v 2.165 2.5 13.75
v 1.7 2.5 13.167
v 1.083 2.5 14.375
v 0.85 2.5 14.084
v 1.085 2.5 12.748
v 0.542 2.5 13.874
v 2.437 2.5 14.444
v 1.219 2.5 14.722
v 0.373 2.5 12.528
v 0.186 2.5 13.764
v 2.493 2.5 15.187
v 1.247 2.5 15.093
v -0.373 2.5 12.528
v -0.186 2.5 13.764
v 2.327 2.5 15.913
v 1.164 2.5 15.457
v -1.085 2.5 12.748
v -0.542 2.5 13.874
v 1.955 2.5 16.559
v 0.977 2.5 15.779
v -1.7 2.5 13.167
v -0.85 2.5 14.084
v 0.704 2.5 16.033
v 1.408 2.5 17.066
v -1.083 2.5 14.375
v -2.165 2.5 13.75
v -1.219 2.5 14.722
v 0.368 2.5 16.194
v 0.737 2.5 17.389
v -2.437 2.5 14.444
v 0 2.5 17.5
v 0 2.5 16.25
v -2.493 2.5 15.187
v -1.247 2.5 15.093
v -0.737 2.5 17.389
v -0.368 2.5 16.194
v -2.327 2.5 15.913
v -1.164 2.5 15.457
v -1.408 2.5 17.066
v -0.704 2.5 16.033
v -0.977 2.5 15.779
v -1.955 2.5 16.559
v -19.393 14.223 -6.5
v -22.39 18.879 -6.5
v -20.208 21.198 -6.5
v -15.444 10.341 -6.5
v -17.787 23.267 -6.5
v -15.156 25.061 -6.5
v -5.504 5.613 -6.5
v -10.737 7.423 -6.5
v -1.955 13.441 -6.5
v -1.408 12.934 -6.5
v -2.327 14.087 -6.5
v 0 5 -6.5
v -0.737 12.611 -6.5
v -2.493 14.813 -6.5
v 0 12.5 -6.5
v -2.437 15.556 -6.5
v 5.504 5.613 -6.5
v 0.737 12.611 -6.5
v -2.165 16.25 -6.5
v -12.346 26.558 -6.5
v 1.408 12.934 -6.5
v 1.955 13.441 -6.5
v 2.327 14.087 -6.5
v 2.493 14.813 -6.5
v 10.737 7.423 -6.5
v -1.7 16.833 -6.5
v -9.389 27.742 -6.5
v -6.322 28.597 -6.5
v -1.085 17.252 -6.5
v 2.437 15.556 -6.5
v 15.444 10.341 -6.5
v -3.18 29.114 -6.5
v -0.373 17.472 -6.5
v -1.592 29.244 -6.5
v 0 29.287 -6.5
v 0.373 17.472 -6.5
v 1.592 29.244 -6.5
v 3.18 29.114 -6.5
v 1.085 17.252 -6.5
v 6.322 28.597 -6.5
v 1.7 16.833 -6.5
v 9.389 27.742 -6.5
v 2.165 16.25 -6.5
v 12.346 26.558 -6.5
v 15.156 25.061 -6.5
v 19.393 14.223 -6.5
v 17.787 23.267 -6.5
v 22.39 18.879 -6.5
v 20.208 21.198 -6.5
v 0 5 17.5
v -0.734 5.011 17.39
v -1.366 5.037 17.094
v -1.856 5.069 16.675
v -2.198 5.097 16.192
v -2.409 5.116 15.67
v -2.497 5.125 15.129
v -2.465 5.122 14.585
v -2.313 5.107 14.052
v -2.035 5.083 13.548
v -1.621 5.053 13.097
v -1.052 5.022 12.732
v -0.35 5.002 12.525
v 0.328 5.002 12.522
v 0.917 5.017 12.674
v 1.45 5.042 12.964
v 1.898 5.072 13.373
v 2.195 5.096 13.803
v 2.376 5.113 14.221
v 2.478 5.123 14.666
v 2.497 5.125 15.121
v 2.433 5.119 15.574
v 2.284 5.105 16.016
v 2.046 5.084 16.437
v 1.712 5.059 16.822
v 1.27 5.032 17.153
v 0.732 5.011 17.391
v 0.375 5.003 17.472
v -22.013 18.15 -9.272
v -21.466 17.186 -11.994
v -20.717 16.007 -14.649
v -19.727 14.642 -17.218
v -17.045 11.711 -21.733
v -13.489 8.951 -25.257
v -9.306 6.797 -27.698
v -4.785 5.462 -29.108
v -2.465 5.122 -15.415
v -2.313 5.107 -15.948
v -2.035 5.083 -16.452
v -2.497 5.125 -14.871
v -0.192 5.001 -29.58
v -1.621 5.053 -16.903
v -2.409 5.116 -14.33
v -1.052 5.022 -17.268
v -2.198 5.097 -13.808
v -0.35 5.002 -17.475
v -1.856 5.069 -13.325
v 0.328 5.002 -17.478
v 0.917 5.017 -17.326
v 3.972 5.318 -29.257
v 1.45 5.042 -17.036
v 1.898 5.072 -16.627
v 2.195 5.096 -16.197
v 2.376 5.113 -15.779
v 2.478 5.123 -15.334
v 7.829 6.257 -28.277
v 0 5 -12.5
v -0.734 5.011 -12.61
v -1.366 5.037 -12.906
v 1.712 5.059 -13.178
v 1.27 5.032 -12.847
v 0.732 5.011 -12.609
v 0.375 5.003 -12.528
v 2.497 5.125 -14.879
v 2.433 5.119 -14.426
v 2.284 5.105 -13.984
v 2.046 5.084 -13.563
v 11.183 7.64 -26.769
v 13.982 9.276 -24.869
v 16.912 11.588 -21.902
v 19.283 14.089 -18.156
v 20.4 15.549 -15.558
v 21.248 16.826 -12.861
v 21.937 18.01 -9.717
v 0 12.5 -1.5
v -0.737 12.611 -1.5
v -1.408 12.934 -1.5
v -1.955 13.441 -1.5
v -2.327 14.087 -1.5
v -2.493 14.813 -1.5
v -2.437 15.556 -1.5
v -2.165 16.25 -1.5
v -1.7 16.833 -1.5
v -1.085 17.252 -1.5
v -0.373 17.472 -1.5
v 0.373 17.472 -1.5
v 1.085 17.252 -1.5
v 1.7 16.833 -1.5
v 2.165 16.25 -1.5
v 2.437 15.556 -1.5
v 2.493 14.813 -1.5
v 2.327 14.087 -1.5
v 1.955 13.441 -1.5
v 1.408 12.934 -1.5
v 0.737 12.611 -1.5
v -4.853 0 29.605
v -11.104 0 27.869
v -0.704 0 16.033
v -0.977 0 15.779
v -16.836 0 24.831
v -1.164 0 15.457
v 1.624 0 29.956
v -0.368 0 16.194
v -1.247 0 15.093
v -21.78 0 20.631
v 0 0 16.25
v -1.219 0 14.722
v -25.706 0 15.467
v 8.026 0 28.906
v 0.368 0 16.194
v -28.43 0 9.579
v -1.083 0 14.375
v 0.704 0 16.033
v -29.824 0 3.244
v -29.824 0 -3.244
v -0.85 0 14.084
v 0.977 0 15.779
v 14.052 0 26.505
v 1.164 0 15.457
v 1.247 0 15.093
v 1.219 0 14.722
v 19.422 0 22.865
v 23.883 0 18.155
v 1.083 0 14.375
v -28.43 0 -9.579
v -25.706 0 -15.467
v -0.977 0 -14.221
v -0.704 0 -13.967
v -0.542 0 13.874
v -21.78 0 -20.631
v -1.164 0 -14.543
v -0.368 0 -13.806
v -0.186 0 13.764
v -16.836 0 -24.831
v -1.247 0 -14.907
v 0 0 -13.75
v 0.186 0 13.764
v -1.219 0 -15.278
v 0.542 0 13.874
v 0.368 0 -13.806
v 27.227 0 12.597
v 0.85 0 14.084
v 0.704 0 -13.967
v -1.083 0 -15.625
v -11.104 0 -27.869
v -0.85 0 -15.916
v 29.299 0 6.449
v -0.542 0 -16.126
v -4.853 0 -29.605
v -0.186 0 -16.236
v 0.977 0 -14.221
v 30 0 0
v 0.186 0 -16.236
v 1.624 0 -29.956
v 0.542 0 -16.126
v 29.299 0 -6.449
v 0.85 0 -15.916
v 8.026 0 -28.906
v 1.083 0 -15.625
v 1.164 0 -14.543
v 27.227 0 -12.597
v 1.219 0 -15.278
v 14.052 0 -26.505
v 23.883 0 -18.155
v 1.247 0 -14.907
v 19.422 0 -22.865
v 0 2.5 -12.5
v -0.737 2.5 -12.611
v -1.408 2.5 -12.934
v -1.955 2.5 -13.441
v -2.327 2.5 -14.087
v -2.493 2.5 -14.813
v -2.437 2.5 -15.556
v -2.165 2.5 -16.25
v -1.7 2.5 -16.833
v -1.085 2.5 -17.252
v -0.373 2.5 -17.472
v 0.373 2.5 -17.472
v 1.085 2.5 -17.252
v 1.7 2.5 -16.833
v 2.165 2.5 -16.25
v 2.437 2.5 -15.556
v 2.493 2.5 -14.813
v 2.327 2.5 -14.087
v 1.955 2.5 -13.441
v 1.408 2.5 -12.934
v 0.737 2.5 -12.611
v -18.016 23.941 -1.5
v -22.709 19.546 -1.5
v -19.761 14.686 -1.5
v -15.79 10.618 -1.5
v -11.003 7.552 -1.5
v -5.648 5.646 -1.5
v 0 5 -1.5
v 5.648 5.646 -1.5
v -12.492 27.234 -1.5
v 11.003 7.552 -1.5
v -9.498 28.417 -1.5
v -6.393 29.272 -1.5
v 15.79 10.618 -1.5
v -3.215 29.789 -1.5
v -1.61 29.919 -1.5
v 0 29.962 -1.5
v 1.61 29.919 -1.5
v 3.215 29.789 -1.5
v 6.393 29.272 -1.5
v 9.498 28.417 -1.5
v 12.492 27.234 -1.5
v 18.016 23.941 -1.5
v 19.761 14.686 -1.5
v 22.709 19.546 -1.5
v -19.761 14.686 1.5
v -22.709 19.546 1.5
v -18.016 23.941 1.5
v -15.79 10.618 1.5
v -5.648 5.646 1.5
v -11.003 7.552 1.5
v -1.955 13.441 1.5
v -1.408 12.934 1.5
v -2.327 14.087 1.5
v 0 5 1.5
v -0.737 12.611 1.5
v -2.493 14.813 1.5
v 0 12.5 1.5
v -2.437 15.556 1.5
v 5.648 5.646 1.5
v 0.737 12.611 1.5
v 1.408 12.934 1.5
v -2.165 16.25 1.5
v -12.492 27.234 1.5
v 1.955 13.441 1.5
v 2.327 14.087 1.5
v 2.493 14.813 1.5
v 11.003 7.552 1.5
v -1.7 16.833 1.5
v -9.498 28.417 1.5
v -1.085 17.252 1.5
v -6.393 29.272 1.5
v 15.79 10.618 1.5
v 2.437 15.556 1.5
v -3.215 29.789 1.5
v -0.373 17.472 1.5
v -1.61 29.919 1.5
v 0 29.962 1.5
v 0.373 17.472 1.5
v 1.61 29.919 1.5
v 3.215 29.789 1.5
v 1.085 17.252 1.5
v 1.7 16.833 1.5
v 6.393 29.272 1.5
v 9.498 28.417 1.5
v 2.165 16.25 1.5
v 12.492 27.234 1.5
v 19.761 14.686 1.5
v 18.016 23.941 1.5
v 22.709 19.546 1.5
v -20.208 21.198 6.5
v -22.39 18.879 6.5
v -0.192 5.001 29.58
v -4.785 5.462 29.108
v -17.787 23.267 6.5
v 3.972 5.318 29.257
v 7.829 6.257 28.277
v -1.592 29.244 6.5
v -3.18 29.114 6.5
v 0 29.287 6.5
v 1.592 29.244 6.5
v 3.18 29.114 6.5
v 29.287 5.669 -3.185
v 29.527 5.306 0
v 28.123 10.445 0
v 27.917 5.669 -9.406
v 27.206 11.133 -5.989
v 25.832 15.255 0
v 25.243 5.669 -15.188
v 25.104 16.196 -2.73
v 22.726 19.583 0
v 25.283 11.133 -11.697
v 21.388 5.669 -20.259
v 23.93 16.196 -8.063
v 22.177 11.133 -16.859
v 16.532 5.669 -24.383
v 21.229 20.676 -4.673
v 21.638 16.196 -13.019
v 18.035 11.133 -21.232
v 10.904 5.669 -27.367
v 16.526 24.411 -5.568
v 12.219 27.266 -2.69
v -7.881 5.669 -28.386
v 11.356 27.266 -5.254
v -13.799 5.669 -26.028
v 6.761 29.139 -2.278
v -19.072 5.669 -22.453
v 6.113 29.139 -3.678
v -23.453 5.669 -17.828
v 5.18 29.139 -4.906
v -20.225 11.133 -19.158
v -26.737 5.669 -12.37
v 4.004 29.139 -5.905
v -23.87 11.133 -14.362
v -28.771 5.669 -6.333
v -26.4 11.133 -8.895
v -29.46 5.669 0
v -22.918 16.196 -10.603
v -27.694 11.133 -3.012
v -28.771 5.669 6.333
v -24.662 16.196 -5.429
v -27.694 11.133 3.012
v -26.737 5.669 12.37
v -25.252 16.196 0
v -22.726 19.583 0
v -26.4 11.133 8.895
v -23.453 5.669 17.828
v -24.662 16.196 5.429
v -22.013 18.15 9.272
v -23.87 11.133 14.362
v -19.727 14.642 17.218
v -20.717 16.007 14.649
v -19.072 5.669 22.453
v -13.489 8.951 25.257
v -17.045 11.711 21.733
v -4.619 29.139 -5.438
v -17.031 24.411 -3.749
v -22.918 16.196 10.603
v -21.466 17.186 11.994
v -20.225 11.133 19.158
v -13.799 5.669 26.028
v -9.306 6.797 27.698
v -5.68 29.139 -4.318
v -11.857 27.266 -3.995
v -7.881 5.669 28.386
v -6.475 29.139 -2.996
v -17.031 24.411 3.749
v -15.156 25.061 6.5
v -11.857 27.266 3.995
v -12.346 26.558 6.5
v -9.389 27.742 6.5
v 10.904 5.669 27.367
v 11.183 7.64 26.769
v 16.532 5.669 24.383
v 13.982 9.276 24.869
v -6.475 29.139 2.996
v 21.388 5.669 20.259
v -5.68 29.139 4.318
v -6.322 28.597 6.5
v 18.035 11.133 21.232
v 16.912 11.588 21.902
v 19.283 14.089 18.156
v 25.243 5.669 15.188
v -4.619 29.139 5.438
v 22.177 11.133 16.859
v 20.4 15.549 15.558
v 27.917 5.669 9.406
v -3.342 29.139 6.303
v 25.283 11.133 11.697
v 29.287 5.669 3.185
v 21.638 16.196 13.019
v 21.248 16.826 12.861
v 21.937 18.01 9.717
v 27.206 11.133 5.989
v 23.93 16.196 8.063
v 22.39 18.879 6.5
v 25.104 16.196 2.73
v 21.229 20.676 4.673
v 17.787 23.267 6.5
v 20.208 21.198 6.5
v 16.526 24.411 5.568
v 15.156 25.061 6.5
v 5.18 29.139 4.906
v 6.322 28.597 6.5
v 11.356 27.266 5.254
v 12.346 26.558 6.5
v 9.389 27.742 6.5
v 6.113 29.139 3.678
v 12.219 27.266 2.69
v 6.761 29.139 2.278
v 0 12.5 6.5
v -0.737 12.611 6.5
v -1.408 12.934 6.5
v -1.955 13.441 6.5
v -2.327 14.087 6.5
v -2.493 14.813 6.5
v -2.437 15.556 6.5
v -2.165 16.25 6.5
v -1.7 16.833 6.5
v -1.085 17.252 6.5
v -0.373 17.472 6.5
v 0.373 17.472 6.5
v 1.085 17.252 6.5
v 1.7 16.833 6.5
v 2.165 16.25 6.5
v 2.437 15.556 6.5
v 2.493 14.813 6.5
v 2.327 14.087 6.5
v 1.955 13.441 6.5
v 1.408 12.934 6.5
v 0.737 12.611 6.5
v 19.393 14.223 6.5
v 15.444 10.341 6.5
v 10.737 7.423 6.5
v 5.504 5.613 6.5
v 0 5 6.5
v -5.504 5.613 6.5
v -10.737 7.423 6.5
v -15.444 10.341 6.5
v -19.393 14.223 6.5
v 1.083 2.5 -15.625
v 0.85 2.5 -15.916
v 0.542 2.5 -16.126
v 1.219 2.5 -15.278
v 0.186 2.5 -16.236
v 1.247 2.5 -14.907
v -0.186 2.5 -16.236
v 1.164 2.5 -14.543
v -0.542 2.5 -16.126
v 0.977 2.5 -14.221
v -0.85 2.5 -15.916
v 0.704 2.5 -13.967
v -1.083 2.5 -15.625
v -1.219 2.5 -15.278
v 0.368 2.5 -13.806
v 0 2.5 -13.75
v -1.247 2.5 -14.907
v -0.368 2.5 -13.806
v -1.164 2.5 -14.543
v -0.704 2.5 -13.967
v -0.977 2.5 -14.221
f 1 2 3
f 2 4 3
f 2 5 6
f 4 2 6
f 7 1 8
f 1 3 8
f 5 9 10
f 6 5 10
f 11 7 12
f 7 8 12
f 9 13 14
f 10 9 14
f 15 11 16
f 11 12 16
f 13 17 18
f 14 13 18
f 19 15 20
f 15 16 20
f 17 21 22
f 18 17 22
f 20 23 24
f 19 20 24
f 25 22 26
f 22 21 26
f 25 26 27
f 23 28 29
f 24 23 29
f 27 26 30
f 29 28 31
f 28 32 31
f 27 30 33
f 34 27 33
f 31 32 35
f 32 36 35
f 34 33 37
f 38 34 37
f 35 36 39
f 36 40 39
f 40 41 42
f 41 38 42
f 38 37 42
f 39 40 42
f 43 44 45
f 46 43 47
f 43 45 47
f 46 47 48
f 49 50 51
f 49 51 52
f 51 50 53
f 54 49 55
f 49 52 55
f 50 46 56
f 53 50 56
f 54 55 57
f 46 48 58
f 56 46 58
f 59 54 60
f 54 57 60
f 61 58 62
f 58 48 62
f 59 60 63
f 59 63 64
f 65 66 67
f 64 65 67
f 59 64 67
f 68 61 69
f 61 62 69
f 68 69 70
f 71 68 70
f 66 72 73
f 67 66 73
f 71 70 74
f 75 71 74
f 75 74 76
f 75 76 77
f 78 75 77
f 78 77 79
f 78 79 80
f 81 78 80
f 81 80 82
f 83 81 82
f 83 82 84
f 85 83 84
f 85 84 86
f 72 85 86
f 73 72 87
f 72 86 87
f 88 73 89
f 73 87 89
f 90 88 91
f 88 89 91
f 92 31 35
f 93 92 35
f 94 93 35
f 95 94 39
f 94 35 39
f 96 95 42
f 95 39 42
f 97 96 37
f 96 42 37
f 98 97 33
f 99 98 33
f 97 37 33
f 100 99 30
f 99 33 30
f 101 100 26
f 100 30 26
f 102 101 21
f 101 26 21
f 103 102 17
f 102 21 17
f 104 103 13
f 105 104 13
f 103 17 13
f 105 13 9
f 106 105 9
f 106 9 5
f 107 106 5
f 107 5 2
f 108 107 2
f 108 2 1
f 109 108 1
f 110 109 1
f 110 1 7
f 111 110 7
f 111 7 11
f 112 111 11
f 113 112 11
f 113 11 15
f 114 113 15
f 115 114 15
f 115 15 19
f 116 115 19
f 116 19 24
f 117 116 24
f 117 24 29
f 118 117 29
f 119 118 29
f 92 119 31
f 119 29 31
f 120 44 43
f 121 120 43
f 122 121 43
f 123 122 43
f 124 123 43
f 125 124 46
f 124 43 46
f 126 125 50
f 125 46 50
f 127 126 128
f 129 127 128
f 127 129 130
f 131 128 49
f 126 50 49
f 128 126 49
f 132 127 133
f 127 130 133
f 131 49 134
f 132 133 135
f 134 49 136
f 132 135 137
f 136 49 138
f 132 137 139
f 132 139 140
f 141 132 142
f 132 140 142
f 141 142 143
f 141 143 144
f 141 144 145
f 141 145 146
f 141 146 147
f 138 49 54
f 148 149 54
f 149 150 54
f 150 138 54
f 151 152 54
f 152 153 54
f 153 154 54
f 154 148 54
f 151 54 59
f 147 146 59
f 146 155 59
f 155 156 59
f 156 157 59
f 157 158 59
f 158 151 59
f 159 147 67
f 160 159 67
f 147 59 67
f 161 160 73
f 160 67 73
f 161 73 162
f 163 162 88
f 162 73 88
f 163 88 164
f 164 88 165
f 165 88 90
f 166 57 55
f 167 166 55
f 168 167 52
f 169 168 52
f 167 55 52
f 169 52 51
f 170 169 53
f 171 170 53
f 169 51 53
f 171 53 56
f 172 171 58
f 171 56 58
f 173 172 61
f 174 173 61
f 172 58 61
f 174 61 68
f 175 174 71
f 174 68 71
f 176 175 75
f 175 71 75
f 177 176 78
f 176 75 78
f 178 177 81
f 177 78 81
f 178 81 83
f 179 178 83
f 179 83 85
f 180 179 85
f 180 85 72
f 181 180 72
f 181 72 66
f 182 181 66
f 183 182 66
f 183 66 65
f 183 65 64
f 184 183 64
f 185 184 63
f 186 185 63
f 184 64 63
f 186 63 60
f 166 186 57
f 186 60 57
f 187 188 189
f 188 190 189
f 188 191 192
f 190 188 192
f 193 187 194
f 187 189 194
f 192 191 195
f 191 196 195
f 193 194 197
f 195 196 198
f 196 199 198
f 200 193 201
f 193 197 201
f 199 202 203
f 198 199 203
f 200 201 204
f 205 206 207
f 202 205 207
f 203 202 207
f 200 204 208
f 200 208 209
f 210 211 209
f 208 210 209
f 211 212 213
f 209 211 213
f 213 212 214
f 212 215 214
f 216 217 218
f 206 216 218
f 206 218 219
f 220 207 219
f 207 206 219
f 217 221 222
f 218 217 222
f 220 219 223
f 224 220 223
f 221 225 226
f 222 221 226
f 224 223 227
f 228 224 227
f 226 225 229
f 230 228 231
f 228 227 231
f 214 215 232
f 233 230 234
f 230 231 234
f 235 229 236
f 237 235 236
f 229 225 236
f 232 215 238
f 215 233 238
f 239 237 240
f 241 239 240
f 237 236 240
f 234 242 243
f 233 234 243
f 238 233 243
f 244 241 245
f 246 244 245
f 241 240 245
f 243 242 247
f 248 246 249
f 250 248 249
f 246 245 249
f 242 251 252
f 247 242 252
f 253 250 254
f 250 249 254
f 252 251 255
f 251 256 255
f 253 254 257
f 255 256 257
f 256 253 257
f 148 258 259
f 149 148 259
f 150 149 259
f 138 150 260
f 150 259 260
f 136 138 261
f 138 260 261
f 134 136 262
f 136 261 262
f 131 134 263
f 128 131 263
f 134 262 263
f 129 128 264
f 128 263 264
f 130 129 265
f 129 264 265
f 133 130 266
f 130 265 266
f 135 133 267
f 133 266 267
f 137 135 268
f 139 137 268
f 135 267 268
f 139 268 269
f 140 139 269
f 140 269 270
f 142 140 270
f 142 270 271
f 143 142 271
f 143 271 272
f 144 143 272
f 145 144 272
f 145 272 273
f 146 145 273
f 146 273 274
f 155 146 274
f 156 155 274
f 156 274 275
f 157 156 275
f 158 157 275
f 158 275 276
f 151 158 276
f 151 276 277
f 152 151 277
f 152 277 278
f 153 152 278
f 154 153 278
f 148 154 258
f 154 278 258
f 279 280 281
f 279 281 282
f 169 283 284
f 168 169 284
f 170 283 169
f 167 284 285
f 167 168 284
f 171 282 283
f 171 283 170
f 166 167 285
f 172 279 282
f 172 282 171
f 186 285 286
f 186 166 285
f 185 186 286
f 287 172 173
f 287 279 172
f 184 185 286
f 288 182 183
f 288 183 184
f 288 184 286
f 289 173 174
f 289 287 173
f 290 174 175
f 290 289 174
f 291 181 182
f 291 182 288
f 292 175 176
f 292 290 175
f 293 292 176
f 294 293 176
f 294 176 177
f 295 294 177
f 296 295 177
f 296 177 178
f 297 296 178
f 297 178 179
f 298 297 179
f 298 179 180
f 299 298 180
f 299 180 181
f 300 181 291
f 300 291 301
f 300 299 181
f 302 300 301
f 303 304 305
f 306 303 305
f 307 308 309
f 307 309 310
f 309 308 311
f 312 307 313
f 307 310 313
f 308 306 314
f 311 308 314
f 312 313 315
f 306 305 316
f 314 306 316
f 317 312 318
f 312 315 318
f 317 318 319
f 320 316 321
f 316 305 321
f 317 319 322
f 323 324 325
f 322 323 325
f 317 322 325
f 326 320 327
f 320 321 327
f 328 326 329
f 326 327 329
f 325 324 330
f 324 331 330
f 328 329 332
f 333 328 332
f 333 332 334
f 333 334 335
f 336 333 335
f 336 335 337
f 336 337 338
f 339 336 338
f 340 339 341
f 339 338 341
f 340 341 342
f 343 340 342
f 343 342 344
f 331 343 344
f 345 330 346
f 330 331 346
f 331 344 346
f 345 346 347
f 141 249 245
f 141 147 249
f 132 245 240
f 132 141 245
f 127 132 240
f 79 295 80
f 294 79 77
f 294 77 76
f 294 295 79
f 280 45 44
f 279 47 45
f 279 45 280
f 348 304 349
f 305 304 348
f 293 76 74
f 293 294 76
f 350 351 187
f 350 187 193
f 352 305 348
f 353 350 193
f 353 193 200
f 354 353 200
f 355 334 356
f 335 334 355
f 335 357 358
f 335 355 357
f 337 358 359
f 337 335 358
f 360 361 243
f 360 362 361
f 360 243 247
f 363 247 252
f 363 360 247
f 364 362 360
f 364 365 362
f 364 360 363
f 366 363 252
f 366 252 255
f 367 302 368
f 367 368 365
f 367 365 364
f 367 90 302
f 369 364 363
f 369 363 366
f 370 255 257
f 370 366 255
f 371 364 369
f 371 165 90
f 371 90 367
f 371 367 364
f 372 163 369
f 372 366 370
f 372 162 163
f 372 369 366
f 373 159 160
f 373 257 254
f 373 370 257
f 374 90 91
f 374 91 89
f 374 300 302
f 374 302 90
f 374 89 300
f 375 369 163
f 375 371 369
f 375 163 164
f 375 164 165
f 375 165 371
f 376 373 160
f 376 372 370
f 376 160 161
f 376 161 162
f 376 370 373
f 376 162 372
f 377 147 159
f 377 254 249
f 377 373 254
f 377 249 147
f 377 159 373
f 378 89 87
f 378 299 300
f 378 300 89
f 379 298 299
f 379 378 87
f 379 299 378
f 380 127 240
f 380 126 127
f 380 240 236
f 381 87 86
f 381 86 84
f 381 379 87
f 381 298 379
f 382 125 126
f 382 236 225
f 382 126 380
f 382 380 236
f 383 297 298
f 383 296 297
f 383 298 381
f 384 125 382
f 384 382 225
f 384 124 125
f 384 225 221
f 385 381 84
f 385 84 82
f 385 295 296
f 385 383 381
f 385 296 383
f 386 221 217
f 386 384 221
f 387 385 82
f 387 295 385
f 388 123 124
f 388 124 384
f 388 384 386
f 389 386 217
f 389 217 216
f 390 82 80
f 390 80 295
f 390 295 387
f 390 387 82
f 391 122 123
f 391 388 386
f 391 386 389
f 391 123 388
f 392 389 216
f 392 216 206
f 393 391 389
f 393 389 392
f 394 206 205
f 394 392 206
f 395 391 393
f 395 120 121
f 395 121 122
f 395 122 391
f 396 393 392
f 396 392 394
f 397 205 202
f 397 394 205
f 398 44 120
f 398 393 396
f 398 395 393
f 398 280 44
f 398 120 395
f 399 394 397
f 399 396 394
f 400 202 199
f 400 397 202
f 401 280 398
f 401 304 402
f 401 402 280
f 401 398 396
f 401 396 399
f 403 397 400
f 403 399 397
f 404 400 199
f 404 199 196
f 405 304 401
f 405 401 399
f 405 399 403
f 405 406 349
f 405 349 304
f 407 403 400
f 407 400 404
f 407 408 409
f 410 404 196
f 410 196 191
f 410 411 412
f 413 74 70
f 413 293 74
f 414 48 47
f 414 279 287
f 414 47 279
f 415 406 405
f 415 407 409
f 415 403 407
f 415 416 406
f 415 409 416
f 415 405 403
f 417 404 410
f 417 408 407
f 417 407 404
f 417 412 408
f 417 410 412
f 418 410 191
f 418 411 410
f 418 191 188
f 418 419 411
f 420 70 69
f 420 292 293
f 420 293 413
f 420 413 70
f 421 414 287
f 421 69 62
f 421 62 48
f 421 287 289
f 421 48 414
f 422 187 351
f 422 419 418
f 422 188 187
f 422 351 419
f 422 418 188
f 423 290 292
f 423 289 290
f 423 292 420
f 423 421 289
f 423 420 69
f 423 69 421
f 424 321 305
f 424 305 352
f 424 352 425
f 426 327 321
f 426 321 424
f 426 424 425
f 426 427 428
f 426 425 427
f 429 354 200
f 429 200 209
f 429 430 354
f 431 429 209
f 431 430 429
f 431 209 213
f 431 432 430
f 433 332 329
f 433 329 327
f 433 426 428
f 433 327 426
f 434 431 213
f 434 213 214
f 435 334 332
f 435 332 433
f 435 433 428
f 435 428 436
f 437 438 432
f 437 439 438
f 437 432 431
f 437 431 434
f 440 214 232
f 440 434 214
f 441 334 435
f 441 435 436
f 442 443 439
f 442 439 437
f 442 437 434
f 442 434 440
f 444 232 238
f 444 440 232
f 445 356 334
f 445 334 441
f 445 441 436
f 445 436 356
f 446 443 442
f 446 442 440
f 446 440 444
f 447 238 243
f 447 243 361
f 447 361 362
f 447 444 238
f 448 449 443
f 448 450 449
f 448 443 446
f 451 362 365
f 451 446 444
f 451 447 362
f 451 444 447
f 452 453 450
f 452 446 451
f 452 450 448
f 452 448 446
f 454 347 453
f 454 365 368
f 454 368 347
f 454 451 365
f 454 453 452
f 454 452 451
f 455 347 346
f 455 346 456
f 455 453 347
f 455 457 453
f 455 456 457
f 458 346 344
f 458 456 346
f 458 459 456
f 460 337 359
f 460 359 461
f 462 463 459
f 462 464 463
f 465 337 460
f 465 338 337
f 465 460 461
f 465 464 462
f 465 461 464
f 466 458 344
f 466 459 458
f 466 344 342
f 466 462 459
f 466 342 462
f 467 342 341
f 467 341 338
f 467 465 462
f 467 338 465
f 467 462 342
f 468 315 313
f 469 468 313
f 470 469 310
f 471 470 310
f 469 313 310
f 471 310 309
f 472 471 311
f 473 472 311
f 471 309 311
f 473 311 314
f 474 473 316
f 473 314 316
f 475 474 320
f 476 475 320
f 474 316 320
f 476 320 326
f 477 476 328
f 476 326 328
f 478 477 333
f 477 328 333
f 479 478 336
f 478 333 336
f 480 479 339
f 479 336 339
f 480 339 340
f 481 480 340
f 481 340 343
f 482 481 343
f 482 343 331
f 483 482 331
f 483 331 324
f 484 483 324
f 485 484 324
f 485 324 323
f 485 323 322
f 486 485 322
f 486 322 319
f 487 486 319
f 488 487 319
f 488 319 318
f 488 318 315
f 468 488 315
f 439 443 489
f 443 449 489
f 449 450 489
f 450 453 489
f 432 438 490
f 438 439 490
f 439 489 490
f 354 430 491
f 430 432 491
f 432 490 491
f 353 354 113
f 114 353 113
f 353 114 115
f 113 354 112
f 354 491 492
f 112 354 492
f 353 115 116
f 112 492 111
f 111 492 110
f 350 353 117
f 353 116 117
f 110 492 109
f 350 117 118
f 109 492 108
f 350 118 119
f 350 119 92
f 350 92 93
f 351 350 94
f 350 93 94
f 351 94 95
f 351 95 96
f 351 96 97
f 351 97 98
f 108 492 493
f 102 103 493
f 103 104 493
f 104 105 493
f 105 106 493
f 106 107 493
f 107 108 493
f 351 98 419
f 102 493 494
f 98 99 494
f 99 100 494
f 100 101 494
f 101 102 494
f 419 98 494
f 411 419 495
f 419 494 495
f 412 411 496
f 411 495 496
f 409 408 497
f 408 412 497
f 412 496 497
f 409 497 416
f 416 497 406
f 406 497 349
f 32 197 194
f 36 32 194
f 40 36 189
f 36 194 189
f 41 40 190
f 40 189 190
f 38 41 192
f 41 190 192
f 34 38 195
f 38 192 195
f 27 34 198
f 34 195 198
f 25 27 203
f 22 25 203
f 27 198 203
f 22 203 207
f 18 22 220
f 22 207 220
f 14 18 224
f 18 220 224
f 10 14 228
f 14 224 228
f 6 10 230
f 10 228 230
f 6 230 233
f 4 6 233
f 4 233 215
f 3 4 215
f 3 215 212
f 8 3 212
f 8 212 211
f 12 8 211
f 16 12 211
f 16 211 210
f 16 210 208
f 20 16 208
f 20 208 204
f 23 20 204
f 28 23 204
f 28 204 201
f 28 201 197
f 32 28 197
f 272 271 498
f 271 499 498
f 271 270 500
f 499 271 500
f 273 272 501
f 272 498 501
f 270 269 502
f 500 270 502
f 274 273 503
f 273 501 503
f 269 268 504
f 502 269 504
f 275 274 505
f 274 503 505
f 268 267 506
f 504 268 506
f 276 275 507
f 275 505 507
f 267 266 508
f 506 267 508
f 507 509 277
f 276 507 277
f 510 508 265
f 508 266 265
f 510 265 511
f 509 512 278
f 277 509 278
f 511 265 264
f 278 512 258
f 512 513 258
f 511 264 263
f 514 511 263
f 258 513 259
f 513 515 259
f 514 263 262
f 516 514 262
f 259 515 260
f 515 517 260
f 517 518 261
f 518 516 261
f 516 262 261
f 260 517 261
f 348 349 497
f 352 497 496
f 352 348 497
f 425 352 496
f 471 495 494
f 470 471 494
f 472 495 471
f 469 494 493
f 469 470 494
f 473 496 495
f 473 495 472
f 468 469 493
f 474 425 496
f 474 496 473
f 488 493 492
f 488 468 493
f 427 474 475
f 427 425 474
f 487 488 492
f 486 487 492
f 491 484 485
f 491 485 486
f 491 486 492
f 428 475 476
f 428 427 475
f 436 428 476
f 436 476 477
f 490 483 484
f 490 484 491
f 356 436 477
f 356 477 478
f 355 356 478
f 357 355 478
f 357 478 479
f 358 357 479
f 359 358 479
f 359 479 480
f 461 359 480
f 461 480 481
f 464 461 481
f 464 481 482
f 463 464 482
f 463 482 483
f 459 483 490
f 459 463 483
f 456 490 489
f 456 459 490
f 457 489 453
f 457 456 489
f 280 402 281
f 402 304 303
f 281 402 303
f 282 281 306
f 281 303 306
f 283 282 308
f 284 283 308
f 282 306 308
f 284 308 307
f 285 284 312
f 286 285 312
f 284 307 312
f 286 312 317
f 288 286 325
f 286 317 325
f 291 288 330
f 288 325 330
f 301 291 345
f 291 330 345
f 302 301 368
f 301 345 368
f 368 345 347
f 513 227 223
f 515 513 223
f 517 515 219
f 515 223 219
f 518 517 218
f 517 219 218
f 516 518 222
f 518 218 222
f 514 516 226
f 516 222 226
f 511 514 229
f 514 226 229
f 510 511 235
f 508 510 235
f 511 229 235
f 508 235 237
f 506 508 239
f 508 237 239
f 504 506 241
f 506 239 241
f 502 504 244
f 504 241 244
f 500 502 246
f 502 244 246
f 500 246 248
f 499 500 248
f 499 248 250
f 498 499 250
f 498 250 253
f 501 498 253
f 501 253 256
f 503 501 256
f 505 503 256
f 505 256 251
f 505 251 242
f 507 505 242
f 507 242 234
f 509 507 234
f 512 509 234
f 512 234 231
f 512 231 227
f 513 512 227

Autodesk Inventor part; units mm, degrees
sketch "Sketch1" plane through (0, 0, 0) normal (0, 0, 1) x (1, 0, 0)
  arc A0 (30, 0) -> (0, 30) centre (0, 0) ccw
  line L0 (30, 0) -> (0, 0)
  line L1 (0, 0) -> (0, 30)
  dimension "d0" = 30
revolve "Revolution1" add sketch "Sketch1" angle 360 about axis through (0, 0, 0) along (0, 1, 0)
sketch "Sketch2" plane through (0, 0, 0) normal (0, 0, 1) x (1, 0, 0)
  circle A0 centre (0, 30) radius 25
  point P0 (0, 0)
  dimension "d2" = 30
  dimension "d3" = 25
extrude "Extrusion1" cut sketch "Sketch2" along normal mid plane 3
ref_plane "Work Plane1" through (0, 0, 6.5) normal (0, 0, 1) x (1, 0, 0)
sketch "Sketch3" plane through (0, 0, 6.5) normal (0, 0, 1) x (1, 0, 0)
  arc A0 (22.7093, 19.5458) -> (-22.7093, 19.5458) centre (0, 0) ccw projected
  arc A1 (-22.7093, 19.5458) -> (22.7093, 19.5458) centre (0, 30) ccw projected
extrude "Extrusion2" cut sketch "Sketch3" along normal through all
ref_plane "Work Plane2" through (0, 0, -6.5) normal (0, 0, 1) x (1, 0, 0)
sketch "Sketch4" plane through (0, 0, -6.5) normal (0, 0, 1) x (1, 0, 0)
  arc A0 (22.7093, 19.5458) -> (-22.7093, 19.5458) centre (0, 0) ccw projected
  arc A1 (-22.7093, 19.5458) -> (22.7093, 19.5458) centre (0, 30) ccw projected
extrude "Extrusion3" cut sketch "Sketch4" against normal through all
sketch "Sketch5" plane through (0, 0, 6.5) normal (0, 0, 1) x (1, 0, 0)
  line L0 (-30, 0) -> (30, 0) projected
  point P0 (0, 0)
  point P1 (0, 15)
  dimension "d12" = 15
hole "Hole1" at (0, 15, 6.5) direction (0, 0, -1) diameter 5 end through all
ref_plane "Work Plane3" through (0, 30, 0) normal (0, 1, 0) x (-1, 0, 0)
sketch "Sketch6" plane through (0, 30, 0) normal (0, 1, 0) x (-1, 0, 0)
  line L0 (0, -15) -> (0, 15) construction
  point P0 (0, 0)
  point P1 (0, 0)
  dimension "d21" = 30
hole "Hole2" at (0, 30, -15) at (0, 30, 15) direction (0, -1, 0) diameter 2.5 end through all counterbore diameter 5 counterbore depth 27.5
properties part number "Part004. Spherical Support" material "Steel, Carbon"
